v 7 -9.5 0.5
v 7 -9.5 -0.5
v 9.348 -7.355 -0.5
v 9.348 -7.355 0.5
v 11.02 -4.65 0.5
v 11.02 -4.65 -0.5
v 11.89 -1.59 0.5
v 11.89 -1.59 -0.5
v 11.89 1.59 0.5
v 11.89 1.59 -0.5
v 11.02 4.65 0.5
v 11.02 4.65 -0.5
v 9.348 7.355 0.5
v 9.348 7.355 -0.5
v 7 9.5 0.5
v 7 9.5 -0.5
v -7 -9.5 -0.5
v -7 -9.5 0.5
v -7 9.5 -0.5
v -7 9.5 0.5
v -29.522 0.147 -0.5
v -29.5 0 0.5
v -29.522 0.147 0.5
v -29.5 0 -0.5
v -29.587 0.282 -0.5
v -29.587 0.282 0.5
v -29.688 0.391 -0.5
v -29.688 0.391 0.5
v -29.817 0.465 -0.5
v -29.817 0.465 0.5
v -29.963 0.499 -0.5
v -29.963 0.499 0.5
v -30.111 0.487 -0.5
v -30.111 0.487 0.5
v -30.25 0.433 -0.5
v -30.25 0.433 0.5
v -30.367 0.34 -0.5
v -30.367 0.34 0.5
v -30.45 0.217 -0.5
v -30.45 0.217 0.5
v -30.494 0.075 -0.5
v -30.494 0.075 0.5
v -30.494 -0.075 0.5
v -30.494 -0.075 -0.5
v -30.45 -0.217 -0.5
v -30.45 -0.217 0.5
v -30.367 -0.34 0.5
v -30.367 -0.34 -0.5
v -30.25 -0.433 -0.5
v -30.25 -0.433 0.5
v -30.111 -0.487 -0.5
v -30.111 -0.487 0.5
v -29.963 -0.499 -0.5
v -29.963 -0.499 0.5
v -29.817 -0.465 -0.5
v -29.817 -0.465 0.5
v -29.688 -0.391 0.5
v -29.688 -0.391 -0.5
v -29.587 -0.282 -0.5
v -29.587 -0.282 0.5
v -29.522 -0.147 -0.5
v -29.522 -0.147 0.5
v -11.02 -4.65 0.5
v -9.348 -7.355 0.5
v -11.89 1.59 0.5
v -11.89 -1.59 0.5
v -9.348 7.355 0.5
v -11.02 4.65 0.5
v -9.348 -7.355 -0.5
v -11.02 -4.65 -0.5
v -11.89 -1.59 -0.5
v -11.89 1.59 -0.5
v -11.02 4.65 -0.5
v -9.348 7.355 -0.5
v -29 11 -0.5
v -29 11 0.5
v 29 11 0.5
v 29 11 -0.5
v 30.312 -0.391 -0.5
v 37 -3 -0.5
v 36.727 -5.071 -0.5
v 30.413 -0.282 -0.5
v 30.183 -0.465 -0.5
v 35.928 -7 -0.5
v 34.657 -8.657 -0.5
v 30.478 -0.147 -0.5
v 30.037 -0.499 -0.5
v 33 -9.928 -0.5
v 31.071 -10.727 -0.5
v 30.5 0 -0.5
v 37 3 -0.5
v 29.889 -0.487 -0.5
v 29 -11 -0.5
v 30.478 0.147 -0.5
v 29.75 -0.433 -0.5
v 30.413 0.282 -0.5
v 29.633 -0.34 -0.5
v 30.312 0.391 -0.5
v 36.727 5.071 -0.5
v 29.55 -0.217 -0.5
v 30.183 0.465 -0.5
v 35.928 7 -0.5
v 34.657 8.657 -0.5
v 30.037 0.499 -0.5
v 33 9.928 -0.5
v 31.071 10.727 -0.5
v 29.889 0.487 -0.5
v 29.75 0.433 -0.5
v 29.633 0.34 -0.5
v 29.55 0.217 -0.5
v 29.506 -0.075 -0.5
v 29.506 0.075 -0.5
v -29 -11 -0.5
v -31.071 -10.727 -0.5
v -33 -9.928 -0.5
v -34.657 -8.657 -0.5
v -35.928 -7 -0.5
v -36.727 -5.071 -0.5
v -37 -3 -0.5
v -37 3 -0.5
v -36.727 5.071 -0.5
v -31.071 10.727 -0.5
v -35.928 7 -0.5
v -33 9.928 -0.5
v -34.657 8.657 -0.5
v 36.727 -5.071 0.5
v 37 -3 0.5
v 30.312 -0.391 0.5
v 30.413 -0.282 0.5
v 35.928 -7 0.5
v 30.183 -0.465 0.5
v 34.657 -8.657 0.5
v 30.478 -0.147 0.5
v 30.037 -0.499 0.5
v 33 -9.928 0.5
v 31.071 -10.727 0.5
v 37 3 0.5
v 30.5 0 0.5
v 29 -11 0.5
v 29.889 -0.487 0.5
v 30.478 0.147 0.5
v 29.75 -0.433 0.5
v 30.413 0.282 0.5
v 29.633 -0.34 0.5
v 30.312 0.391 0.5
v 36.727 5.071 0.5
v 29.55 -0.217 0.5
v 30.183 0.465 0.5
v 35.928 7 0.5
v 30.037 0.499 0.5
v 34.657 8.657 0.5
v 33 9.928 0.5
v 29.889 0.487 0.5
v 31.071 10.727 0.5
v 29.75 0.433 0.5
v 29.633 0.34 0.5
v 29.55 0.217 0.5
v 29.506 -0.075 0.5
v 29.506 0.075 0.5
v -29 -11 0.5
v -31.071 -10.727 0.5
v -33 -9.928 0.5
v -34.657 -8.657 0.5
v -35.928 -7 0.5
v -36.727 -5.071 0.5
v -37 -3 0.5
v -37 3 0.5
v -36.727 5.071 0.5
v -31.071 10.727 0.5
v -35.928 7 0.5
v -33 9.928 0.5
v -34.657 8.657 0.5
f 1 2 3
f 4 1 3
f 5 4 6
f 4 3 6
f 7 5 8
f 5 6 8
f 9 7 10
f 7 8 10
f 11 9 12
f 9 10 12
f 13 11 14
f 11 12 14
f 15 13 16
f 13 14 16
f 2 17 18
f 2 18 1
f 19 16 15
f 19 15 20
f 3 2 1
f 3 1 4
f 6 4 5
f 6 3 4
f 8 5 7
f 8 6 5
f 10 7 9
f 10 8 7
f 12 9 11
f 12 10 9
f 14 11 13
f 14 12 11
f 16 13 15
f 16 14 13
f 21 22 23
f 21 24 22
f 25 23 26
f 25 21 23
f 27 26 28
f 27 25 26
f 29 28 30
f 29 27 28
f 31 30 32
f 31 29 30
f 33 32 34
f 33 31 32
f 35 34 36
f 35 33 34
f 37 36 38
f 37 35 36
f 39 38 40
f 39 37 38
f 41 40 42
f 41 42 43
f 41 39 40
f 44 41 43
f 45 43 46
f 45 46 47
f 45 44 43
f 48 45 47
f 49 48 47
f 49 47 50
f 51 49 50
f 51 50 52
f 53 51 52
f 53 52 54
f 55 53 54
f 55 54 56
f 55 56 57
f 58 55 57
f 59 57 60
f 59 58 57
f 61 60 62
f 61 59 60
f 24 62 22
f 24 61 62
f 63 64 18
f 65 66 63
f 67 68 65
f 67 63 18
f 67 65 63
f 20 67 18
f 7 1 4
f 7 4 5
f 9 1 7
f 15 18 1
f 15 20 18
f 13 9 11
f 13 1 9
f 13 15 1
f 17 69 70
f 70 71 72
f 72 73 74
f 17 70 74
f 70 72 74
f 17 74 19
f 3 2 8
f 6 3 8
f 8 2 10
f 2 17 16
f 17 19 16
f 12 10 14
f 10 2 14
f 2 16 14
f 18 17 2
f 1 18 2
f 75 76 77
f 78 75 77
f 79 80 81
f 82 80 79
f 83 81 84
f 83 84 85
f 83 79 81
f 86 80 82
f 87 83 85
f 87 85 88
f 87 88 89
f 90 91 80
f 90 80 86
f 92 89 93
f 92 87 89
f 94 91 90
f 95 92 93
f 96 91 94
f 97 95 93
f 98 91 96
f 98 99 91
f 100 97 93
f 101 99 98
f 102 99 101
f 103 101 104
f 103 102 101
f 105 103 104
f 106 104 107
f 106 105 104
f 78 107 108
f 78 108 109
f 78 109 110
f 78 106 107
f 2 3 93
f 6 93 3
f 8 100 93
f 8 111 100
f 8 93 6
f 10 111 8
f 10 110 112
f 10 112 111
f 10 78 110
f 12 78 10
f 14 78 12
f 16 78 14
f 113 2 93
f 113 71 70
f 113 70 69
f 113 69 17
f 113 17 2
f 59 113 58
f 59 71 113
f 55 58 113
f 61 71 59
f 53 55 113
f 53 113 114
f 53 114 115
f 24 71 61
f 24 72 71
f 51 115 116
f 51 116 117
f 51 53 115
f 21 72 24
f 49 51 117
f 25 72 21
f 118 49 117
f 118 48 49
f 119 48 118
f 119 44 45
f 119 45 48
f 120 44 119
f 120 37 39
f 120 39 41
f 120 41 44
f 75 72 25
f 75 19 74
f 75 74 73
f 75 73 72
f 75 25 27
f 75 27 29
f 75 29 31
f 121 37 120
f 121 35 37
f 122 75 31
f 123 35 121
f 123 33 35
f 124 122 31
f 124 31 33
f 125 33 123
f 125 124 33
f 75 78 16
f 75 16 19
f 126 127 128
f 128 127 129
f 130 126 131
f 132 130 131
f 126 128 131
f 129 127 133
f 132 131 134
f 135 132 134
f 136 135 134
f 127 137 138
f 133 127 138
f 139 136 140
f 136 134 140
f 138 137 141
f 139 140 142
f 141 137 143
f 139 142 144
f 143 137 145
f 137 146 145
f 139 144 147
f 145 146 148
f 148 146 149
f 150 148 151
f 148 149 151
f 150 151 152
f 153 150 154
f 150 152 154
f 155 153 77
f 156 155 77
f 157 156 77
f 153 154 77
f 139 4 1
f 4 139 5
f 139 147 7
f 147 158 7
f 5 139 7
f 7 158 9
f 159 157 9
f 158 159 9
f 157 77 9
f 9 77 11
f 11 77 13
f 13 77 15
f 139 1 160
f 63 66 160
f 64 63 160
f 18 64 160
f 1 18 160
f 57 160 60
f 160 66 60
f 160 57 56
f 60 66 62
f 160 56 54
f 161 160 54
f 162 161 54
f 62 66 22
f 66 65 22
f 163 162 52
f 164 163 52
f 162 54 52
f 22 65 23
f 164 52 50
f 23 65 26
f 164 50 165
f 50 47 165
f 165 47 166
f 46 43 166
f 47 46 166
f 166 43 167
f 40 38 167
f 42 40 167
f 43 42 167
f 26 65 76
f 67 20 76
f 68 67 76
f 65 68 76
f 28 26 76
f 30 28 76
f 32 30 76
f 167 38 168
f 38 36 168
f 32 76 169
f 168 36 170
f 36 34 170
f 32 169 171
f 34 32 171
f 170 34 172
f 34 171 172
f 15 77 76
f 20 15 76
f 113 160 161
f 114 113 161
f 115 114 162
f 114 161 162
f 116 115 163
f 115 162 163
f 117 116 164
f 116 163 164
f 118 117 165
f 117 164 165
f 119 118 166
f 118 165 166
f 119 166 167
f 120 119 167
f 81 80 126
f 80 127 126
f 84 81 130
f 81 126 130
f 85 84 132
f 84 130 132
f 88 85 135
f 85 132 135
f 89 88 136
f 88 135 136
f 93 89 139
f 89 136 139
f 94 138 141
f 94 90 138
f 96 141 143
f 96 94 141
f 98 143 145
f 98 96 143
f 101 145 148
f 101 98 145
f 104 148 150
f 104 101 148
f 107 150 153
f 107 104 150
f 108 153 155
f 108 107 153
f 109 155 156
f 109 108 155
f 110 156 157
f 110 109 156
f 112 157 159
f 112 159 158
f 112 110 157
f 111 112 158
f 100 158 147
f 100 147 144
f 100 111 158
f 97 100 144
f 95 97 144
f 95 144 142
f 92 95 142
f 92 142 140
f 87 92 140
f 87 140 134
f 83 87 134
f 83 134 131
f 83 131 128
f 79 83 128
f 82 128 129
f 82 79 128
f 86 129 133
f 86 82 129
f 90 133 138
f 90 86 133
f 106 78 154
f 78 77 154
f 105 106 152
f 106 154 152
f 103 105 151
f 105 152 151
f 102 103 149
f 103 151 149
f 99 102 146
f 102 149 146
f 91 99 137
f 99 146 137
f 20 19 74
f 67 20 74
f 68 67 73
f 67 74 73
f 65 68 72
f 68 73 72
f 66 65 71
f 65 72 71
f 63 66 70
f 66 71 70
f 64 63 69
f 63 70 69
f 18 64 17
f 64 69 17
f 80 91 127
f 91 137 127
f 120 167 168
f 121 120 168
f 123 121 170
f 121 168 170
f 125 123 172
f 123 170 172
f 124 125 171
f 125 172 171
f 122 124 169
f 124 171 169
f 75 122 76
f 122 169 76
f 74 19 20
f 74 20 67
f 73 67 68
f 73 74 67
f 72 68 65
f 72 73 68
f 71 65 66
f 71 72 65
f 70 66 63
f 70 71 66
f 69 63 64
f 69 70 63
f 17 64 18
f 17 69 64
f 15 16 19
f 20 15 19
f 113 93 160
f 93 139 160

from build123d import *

# Parameters (mm, degrees)
SKETCH1_R           = 0.5
BOSS_EXTRUDE1_DEPTH = 0.5
SPLIT1_START        = -0.5
SPLIT1_DEPTH        = 1
SPLIT1_2_DEPTH      = 1


# Read off the part's stored shape, not the designer's step: Split1
with BuildPart() as part:
    # Sketch1 → Boss-Extrude1 (new, symmetric)
    with BuildSketch(Plane.XY):
        with BuildLine():
            Line((-29, 11), (29, 11))
            ThreePointArc((29, 11), (34.656854249, 8.656854249), (37, 3))
            Line((37, 3), (37, -3))
            ThreePointArc((37, -3), (34.656854249, -8.656854249), (29, -11))
            Line((29, -11), (-29, -11))
            ThreePointArc((-29, -11), (-34.656854249, -8.656854249), (-37, -3))
            Line((-37, -3), (-37, 3))
            ThreePointArc((-37, 3), (-34.656854249, 8.656854249), (-29, 11))
        make_face()
        with Locations((-30, 0)):
            Circle(SKETCH1_R, mode=Mode.SUBTRACT)
        with Locations((30, 0)):
            Circle(SKETCH1_R, mode=Mode.SUBTRACT)
    extrude(amount=BOSS_EXTRUDE1_DEPTH, both=True)

    # Split1 2 outline → Split1 2 (cut)
    with BuildSketch(Plane.XY.offset(SPLIT1_START)):
        with BuildLine():
            Line((7, 9.5), (-7, 9.5))
            ThreePointArc((-7, 9.5), (-12, 0), (-7, -9.5))
            Line((-7, -9.5), (7, -9.5))
            ThreePointArc((7, -9.5), (12, 0), (7, 9.5))
        make_face()
    extrude(amount=SPLIT1_2_DEPTH, mode=Mode.SUBTRACT)


with BuildPart() as body_2:
    # Split1 outline → Split1 (new body)
    with BuildSketch(Plane.XY.offset(SPLIT1_START)):
        with BuildLine():
            ThreePointArc((7, -9.5), (12, 0), (7, 9.5))
            Line((7, 9.5), (-7, 9.5))
            ThreePointArc((-7, 9.5), (-12, 0), (-7, -9.5))
            Line((-7, -9.5), (7, -9.5))
        make_face()
    extrude(amount=SPLIT1_DEPTH)


solid = Compound([part.part, body_2.part])
